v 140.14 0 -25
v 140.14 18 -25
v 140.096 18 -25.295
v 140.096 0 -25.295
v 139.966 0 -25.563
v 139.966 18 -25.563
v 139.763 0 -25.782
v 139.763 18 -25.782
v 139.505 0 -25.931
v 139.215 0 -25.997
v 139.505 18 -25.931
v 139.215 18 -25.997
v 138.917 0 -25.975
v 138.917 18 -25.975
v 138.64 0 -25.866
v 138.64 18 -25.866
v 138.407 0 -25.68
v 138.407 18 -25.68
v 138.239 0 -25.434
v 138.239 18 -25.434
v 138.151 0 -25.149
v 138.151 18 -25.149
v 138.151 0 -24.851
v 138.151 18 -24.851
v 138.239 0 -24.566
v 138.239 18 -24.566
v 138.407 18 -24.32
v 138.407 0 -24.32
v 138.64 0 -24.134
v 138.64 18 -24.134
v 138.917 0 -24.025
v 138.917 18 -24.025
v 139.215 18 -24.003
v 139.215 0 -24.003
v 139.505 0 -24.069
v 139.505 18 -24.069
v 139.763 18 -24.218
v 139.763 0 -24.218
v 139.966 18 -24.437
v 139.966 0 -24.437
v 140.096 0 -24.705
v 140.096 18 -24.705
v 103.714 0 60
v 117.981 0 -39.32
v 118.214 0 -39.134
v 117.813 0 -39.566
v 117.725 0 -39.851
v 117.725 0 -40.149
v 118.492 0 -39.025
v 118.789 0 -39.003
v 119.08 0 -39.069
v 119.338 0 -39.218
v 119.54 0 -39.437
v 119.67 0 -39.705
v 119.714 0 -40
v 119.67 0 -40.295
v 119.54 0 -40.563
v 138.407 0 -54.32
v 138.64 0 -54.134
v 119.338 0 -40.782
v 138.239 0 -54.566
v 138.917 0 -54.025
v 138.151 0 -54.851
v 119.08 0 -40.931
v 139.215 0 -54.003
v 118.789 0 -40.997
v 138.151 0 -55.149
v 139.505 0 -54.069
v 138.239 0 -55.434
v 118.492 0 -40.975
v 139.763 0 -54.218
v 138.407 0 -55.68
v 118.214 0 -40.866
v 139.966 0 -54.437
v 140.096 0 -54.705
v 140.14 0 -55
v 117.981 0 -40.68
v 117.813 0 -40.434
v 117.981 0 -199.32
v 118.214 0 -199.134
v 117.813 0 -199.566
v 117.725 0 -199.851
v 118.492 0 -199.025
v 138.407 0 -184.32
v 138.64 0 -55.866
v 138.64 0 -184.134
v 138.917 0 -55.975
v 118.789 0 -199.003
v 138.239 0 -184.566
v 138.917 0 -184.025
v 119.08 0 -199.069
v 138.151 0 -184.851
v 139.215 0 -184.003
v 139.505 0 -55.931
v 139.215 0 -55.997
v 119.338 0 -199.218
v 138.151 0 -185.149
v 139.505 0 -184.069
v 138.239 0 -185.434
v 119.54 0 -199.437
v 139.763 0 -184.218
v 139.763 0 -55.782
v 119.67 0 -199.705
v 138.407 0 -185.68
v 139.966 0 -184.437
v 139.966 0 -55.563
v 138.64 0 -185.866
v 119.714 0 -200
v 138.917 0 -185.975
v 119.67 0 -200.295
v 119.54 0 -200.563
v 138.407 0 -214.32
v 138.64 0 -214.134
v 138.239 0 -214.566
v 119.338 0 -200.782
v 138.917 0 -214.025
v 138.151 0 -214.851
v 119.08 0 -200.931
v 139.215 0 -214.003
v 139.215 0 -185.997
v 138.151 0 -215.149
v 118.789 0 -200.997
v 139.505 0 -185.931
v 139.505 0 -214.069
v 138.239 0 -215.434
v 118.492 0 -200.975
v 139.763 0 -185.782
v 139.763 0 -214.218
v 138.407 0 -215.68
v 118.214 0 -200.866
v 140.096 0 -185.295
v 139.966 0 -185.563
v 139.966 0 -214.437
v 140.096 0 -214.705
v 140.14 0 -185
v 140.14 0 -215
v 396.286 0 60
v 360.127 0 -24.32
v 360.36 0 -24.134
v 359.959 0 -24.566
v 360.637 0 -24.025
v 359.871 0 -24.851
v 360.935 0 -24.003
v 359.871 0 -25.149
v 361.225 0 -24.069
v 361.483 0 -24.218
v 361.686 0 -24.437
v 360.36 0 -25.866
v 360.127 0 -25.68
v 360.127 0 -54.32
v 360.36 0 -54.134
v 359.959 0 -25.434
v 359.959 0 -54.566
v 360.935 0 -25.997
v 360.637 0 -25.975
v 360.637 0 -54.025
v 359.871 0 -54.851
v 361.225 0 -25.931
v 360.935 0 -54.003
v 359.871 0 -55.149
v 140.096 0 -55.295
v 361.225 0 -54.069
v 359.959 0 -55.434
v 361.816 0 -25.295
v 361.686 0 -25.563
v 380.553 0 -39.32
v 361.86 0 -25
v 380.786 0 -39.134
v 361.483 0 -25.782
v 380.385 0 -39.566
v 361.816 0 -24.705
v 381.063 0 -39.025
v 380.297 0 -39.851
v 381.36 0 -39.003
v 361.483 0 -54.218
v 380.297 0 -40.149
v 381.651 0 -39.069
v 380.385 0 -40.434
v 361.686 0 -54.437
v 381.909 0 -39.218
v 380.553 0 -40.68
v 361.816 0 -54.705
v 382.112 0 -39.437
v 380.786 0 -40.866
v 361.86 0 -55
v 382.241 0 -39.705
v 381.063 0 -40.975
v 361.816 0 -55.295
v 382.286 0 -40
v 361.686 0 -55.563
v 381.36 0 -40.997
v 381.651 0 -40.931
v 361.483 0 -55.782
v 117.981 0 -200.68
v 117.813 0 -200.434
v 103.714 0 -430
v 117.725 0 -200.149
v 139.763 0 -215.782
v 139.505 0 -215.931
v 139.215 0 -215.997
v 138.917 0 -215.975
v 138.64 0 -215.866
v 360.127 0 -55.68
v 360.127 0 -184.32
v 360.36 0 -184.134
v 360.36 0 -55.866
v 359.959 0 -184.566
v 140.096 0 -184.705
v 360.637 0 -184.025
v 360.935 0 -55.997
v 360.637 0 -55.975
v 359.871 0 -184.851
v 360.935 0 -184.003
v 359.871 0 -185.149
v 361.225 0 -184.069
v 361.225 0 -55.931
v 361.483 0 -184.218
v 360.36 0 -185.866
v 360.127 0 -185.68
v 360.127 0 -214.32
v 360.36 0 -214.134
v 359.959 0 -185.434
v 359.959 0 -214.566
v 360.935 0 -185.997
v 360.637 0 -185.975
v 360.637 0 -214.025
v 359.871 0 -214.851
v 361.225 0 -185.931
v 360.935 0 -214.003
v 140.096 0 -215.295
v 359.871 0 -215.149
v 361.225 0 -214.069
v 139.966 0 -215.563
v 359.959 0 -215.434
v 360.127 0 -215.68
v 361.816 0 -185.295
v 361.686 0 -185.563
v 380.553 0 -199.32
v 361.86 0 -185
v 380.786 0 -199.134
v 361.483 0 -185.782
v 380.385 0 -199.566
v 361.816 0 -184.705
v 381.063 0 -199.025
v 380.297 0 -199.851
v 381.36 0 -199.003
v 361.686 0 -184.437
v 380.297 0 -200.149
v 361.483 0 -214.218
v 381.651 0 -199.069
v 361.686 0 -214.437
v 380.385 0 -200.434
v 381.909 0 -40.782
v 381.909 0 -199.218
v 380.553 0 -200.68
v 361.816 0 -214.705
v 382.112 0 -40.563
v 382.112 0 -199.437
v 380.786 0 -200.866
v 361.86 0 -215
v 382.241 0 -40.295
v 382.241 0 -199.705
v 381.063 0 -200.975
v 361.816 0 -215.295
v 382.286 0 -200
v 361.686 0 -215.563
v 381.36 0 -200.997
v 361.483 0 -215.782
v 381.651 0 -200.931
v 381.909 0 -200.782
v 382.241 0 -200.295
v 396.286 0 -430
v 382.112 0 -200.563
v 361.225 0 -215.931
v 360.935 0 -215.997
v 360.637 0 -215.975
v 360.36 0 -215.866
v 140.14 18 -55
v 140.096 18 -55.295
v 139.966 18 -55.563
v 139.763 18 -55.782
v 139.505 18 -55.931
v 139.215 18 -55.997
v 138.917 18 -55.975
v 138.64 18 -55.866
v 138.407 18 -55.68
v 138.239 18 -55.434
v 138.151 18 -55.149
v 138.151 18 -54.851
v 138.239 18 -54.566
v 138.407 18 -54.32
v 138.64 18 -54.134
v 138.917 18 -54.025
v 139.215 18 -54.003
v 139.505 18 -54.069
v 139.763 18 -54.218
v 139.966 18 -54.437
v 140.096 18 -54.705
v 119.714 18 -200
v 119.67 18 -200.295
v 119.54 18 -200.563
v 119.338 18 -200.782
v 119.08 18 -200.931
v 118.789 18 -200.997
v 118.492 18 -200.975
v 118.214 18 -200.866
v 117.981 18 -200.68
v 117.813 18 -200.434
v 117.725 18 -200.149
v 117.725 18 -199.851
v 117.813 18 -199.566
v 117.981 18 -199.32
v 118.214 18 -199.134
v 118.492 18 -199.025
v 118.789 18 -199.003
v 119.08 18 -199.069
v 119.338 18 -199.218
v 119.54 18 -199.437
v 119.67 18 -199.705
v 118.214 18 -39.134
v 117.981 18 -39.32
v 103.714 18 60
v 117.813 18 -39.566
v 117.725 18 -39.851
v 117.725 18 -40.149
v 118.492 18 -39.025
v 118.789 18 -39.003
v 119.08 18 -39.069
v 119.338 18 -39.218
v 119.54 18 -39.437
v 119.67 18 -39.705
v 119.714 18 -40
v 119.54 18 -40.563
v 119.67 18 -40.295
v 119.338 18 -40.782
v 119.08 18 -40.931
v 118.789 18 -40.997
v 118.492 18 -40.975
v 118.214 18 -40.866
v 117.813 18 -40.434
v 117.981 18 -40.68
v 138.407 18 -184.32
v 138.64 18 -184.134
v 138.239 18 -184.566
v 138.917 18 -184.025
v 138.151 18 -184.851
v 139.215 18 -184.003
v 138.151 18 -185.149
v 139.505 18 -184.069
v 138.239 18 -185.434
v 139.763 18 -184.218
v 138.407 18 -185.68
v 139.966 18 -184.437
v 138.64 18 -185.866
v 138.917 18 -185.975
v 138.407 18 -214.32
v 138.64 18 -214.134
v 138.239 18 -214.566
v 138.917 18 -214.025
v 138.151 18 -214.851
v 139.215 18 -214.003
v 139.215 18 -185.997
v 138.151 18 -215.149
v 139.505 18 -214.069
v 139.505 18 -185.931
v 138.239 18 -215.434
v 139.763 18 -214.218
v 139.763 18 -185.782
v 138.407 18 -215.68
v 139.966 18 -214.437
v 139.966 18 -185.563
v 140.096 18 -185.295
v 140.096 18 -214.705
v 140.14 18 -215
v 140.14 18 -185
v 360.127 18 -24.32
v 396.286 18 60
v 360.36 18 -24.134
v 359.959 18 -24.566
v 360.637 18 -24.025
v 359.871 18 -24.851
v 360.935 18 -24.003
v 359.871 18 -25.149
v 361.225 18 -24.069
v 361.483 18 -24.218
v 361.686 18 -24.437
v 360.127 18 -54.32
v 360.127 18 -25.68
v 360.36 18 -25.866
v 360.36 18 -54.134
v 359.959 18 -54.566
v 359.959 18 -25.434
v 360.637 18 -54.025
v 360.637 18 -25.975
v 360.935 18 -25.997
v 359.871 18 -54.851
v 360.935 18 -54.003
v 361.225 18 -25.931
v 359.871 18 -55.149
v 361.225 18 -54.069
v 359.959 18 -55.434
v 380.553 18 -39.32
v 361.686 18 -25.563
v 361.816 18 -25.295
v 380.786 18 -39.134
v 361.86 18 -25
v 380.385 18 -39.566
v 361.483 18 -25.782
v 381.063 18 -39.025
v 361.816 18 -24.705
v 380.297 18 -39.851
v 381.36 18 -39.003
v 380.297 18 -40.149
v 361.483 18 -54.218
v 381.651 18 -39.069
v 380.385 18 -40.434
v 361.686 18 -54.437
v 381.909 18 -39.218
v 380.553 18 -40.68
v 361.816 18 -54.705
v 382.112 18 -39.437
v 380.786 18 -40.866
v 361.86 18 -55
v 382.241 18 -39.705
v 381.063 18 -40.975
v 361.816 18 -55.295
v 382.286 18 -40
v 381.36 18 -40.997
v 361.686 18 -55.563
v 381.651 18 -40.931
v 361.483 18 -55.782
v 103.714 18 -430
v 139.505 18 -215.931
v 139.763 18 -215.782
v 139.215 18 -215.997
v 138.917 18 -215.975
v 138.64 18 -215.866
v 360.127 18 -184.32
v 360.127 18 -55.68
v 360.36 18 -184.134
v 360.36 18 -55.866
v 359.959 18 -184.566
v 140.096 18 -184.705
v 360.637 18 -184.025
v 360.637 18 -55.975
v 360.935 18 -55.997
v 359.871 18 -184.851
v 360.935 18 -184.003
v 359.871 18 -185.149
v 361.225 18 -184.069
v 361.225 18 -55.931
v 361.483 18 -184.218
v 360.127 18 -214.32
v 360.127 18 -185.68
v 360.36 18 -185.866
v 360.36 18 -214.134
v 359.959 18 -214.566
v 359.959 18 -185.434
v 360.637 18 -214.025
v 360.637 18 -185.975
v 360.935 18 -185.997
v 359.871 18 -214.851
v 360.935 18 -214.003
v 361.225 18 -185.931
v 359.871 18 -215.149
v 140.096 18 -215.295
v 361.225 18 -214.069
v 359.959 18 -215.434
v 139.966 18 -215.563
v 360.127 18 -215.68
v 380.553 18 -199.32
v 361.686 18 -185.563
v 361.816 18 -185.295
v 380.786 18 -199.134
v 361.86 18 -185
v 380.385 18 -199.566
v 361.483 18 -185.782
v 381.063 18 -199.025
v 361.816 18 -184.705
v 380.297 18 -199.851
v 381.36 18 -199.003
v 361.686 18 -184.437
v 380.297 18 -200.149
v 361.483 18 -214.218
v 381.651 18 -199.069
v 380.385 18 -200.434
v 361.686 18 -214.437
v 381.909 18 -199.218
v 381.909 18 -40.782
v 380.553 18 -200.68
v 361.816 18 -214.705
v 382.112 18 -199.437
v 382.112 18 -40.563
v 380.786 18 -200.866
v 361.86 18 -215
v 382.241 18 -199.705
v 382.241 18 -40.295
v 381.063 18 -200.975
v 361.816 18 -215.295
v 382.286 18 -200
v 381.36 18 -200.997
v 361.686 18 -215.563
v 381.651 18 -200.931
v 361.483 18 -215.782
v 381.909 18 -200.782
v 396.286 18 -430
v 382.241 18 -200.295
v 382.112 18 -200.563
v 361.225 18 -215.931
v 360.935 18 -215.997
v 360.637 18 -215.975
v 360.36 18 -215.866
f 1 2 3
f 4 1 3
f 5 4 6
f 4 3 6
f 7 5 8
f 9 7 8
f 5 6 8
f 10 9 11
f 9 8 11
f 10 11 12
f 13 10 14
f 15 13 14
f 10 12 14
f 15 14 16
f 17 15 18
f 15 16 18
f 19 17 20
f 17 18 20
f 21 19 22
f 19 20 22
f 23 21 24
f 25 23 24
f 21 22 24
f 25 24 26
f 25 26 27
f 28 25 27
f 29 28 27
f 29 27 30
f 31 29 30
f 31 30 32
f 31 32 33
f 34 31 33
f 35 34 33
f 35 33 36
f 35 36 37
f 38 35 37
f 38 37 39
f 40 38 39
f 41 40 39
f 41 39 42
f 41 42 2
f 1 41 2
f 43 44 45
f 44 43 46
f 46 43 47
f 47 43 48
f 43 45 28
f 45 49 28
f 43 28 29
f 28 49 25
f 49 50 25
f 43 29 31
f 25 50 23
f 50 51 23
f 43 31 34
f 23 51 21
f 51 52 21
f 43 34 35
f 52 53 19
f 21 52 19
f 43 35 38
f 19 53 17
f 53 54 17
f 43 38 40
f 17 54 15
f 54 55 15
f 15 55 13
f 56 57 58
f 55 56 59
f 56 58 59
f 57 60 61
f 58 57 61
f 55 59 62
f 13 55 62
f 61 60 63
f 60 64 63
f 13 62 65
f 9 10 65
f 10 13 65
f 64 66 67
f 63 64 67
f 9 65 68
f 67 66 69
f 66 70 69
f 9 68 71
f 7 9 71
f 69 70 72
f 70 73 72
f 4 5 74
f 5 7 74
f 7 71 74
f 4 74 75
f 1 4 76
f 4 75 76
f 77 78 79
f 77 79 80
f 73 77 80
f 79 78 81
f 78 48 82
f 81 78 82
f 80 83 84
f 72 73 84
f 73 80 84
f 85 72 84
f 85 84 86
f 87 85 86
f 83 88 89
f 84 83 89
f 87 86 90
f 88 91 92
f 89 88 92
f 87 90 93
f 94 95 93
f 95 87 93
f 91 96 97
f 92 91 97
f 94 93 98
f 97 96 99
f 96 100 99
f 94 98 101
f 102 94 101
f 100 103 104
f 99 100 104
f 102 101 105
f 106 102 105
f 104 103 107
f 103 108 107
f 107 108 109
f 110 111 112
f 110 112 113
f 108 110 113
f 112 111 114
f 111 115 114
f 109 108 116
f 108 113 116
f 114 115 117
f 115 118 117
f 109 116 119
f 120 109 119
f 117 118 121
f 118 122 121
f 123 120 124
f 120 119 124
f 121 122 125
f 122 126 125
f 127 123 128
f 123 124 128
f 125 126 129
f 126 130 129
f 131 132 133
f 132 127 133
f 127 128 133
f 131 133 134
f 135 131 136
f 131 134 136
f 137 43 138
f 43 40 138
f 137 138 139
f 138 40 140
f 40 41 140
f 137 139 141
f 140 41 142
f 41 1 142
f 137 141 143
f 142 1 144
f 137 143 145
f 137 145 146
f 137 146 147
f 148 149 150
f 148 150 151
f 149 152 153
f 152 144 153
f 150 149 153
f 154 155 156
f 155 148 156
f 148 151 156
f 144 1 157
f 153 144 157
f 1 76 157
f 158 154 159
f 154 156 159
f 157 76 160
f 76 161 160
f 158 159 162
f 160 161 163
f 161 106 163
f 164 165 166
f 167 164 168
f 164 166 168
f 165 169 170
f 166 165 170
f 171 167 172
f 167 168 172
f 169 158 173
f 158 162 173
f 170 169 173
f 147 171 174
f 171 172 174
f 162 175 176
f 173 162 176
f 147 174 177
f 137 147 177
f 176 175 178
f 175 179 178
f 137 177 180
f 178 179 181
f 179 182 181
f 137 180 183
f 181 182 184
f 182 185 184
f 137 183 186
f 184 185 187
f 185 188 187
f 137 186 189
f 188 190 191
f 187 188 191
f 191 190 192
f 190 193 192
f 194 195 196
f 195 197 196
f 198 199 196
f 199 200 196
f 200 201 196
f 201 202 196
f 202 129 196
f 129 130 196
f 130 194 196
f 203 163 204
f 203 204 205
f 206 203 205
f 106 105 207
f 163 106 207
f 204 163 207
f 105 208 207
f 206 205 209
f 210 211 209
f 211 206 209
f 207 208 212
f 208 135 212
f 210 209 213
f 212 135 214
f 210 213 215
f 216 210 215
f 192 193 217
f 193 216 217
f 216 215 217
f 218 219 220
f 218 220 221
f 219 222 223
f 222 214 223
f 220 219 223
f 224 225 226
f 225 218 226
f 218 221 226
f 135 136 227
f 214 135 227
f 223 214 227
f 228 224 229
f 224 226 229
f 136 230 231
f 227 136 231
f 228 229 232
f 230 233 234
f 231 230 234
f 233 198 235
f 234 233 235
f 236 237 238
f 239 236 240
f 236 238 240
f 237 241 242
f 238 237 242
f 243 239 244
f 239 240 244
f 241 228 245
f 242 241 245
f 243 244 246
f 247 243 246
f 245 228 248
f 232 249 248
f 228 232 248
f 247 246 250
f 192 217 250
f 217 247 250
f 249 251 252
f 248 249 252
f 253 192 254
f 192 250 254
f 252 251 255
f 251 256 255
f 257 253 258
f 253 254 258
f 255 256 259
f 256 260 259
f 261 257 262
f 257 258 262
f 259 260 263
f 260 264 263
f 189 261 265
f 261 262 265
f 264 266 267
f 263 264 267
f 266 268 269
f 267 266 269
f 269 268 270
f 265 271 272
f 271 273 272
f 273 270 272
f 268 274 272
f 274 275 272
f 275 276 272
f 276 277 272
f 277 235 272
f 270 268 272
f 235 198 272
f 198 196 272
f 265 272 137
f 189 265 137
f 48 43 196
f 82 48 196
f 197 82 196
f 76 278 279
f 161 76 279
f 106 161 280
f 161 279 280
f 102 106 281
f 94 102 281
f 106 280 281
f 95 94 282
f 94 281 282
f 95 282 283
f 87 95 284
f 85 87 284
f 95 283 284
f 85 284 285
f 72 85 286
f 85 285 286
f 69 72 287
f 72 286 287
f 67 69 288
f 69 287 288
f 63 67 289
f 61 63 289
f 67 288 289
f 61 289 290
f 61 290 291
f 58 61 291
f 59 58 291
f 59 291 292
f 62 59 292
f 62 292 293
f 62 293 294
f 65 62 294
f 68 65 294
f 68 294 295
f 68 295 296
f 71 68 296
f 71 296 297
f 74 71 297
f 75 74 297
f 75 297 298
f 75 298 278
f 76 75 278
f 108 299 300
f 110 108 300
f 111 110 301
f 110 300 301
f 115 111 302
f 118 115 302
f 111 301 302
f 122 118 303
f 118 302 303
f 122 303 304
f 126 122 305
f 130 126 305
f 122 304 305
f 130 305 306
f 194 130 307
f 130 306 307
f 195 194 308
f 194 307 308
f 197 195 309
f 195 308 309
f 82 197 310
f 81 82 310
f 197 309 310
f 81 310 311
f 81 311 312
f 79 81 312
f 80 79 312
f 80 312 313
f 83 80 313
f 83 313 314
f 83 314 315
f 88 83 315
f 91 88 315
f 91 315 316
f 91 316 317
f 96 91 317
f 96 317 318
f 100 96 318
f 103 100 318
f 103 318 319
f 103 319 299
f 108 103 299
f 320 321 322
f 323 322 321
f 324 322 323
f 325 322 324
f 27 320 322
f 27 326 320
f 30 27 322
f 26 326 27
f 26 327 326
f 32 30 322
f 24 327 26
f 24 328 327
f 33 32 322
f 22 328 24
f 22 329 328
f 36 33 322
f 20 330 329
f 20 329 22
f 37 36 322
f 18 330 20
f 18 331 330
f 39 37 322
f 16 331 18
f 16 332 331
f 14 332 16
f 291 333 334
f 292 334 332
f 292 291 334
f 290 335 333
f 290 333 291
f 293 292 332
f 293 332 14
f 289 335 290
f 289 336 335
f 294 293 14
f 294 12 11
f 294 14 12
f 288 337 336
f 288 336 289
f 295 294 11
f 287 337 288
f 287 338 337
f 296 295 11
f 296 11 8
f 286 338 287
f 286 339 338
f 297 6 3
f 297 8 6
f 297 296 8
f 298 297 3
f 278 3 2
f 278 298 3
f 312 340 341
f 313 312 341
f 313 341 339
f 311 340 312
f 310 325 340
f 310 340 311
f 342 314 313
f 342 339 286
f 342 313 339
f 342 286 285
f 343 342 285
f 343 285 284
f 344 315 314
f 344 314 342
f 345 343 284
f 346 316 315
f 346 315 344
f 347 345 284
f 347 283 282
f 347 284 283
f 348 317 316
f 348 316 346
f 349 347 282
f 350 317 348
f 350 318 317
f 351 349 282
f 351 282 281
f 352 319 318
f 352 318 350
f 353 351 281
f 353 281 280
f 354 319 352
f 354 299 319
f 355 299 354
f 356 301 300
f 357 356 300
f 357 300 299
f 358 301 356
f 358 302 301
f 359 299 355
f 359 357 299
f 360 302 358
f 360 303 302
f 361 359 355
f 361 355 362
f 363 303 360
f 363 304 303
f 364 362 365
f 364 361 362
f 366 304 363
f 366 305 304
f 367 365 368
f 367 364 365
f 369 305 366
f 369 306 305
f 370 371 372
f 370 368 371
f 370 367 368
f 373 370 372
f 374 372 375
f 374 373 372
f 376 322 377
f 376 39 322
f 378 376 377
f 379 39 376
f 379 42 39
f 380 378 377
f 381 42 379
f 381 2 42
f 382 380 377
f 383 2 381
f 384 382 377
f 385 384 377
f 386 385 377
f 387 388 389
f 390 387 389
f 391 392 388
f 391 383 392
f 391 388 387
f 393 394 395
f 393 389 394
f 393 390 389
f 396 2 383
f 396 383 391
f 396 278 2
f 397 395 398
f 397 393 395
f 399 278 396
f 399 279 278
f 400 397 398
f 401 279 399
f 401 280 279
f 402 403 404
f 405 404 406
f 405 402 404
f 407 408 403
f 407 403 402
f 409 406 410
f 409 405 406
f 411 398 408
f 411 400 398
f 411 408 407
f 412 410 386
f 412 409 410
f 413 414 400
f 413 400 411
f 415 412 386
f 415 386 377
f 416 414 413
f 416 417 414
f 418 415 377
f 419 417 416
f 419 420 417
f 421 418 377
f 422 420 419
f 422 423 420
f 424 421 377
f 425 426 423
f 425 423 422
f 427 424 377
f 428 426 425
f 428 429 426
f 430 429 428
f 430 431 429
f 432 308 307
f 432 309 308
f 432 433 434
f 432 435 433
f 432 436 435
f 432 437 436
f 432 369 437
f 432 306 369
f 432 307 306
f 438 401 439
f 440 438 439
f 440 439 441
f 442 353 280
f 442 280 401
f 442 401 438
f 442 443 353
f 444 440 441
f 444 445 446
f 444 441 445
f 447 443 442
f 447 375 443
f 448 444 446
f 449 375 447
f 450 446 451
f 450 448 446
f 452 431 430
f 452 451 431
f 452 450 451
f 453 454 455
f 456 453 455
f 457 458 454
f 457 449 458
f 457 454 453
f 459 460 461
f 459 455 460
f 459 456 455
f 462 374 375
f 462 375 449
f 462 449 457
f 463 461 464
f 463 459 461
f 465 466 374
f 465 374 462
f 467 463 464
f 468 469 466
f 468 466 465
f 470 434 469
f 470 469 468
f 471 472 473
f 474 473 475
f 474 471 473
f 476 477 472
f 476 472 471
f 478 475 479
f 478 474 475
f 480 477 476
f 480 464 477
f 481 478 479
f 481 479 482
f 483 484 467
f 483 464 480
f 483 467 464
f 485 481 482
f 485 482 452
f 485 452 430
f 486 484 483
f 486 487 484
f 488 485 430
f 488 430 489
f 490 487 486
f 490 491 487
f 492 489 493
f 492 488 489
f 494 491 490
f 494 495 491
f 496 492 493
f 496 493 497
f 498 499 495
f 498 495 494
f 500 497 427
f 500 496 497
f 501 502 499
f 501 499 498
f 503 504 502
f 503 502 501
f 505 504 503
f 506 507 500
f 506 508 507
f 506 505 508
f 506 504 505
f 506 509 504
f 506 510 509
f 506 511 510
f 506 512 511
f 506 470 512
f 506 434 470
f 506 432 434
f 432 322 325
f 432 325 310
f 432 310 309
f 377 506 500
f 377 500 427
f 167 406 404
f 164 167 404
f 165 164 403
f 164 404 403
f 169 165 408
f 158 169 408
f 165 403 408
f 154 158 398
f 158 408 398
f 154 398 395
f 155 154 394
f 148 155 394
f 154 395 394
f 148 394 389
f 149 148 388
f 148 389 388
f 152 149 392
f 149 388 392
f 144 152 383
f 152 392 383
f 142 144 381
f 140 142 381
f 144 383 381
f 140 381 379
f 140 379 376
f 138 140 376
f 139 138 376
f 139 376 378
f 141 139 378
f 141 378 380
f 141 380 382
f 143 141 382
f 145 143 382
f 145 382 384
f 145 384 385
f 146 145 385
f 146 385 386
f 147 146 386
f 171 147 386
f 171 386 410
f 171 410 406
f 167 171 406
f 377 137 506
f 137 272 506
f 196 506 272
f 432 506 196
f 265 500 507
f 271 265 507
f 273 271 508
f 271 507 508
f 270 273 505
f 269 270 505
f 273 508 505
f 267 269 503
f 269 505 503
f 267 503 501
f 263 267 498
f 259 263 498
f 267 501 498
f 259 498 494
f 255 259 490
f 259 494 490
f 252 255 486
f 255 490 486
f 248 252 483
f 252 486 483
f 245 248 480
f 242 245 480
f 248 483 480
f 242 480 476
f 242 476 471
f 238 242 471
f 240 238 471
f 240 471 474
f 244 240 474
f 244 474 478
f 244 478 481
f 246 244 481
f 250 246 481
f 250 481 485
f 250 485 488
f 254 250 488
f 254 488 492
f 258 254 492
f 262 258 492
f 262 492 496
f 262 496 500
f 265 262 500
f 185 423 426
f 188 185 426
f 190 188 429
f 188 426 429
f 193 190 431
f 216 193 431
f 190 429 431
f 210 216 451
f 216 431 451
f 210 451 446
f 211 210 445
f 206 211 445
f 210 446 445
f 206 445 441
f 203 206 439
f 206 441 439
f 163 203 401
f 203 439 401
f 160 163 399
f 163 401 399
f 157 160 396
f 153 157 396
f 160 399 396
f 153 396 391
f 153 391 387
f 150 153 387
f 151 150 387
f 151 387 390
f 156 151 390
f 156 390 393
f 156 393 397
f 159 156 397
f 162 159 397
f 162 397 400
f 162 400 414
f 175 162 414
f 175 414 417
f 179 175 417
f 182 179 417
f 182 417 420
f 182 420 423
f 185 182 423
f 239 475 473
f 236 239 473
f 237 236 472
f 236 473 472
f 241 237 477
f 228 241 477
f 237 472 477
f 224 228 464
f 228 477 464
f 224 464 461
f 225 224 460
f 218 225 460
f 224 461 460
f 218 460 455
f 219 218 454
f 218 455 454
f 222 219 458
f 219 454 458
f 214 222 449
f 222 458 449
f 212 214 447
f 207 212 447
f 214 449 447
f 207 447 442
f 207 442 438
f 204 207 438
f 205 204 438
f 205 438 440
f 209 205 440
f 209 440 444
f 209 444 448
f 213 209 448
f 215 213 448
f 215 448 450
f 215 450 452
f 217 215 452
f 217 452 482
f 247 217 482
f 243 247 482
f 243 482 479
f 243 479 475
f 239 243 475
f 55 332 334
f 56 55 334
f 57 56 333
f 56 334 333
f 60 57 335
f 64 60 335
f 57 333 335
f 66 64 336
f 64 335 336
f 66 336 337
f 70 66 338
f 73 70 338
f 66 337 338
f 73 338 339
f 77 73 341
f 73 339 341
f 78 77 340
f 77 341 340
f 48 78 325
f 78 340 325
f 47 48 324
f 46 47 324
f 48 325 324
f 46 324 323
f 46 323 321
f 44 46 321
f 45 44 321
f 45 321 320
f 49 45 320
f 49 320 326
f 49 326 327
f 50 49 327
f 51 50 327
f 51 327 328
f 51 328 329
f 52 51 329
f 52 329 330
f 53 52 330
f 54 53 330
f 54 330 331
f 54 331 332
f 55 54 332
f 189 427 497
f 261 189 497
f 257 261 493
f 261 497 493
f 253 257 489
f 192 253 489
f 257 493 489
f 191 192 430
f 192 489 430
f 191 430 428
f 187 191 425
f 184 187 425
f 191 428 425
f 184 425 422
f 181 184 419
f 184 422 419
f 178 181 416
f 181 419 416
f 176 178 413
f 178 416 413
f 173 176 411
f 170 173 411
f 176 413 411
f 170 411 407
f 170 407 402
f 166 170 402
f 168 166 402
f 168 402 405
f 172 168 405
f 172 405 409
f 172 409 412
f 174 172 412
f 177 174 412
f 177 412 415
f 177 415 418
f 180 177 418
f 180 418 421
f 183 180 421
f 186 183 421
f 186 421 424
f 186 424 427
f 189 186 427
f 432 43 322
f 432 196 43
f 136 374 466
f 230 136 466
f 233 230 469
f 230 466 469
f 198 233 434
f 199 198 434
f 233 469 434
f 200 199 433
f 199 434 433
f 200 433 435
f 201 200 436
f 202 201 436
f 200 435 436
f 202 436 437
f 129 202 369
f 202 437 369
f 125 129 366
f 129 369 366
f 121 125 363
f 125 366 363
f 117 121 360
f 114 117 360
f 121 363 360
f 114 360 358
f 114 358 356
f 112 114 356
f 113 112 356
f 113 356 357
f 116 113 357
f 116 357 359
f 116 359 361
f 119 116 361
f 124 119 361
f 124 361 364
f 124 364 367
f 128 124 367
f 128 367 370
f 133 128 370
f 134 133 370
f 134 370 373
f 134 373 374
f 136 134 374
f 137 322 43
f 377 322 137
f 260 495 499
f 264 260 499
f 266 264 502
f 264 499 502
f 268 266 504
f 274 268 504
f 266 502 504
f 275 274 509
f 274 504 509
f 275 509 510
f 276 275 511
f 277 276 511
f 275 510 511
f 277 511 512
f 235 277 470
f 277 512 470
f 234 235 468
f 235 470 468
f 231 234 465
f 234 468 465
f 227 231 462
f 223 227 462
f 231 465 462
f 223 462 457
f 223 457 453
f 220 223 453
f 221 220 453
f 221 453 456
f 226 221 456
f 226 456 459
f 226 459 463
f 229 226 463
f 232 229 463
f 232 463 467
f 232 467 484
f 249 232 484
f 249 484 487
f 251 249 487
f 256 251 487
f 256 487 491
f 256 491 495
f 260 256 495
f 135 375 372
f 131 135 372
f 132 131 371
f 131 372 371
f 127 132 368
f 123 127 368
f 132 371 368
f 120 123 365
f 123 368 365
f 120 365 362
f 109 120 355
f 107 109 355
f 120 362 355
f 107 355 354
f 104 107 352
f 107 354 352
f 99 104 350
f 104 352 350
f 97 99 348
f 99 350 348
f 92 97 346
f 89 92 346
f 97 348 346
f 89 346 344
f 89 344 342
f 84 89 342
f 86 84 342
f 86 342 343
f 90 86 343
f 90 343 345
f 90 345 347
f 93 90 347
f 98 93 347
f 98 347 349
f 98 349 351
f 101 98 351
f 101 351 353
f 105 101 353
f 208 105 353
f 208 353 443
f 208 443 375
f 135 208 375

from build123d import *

# Parameters (mm, degrees)
SKETCH_1_W          = 400
SKETCH_1_H          = 240
EXTRUDE_1_DEPTH     = 18
SKETCH_2_R          = 1
CUT_EXTRUDE_1_DEPTH = 19
SKETCH_3_W          = 615.978672802
SKETCH_3_H          = 327.558551324
SKETCH_3_W_2        = 292.571526578
SKETCH_3_H_2        = 220
CUT_EXTRUDE_2_DEPTH = 19
SKETCH_4_W          = 292.571526578
SKETCH_4_H          = 18
EXTRUDE_2_DEPTH     = 200
SKETCH_5_W          = 292.571526578
SKETCH_5_H          = 18
EXTRUDE_3_DEPTH     = 70


with BuildPart() as part:
    # Эскиз1 → Бобышка-Вытянуть1 (new body)
    with BuildSketch(Plane(origin=(0, 0, 0), x_dir=(1, 0, 0), z_dir=(0, 1, 0))):
        with Locations((200, 120)):
            Rectangle(SKETCH_1_W, SKETCH_1_H)
    extrude(amount=EXTRUDE_1_DEPTH)

    # Эскиз2 → Вырез-Вытянуть1 (cut, through all)
    with BuildSketch(Plane(origin=(0, 18, 0), x_dir=(1, 0, 0), z_dir=(0, 1, 0))):
        with Locations((360.86, 55)):
            Circle(SKETCH_2_R)
        with Locations((360.86, 25)):
            Circle(SKETCH_2_R)
        with Locations((381.285763289, 40)):
            Circle(SKETCH_2_R)
        with Locations((118.714236711, 40)):
            Circle(SKETCH_2_R)
        with Locations((139.14, 25)):
            Circle(SKETCH_2_R)
        with Locations((139.14, 55)):
            Circle(SKETCH_2_R)
        with Locations((381.285763289, 200)):
            Circle(SKETCH_2_R)
        with Locations((360.86, 215)):
            Circle(SKETCH_2_R)
        with Locations((360.86, 185)):
            Circle(SKETCH_2_R)
        with Locations((139.14, 185)):
            Circle(SKETCH_2_R)
        with Locations((139.14, 215)):
            Circle(SKETCH_2_R)
        with Locations((118.714236711, 200)):
            Circle(SKETCH_2_R)
    extrude(amount=-CUT_EXTRUDE_1_DEPTH, mode=Mode.SUBTRACT)

    # Эскиз3 → Вырез-Вытянуть2 (cut, through all)
    with BuildSketch(Plane(origin=(0, 18, 0), x_dir=(1, 0, 0), z_dir=(0, 1, 0))):
        with Locations((196.616519556, 120.940245782)):
            Rectangle(SKETCH_3_W, SKETCH_3_H)
        with Locations((250, 120)):
            Rectangle(SKETCH_3_W_2, SKETCH_3_H_2, mode=Mode.SUBTRACT)
    extrude(amount=-CUT_EXTRUDE_2_DEPTH, mode=Mode.SUBTRACT)

    # Эскиз4 → Бобышка-Вытянуть2 (add)
    with BuildSketch(Plane(origin=(0, 0, -230), x_dir=(-1, 0, 0), z_dir=(0, 0, -1))):
        with Locations((-250, 9)):
            Rectangle(SKETCH_4_W, SKETCH_4_H)
    extrude(amount=EXTRUDE_2_DEPTH)

    # Эскиз5 → Бобышка-Вытянуть3 (add)
    with BuildSketch(Plane.XY.offset(-10)):
        with Locations((250, 9)):
            Rectangle(SKETCH_5_W, SKETCH_5_H)
    extrude(amount=EXTRUDE_3_DEPTH)


solid = part.part
